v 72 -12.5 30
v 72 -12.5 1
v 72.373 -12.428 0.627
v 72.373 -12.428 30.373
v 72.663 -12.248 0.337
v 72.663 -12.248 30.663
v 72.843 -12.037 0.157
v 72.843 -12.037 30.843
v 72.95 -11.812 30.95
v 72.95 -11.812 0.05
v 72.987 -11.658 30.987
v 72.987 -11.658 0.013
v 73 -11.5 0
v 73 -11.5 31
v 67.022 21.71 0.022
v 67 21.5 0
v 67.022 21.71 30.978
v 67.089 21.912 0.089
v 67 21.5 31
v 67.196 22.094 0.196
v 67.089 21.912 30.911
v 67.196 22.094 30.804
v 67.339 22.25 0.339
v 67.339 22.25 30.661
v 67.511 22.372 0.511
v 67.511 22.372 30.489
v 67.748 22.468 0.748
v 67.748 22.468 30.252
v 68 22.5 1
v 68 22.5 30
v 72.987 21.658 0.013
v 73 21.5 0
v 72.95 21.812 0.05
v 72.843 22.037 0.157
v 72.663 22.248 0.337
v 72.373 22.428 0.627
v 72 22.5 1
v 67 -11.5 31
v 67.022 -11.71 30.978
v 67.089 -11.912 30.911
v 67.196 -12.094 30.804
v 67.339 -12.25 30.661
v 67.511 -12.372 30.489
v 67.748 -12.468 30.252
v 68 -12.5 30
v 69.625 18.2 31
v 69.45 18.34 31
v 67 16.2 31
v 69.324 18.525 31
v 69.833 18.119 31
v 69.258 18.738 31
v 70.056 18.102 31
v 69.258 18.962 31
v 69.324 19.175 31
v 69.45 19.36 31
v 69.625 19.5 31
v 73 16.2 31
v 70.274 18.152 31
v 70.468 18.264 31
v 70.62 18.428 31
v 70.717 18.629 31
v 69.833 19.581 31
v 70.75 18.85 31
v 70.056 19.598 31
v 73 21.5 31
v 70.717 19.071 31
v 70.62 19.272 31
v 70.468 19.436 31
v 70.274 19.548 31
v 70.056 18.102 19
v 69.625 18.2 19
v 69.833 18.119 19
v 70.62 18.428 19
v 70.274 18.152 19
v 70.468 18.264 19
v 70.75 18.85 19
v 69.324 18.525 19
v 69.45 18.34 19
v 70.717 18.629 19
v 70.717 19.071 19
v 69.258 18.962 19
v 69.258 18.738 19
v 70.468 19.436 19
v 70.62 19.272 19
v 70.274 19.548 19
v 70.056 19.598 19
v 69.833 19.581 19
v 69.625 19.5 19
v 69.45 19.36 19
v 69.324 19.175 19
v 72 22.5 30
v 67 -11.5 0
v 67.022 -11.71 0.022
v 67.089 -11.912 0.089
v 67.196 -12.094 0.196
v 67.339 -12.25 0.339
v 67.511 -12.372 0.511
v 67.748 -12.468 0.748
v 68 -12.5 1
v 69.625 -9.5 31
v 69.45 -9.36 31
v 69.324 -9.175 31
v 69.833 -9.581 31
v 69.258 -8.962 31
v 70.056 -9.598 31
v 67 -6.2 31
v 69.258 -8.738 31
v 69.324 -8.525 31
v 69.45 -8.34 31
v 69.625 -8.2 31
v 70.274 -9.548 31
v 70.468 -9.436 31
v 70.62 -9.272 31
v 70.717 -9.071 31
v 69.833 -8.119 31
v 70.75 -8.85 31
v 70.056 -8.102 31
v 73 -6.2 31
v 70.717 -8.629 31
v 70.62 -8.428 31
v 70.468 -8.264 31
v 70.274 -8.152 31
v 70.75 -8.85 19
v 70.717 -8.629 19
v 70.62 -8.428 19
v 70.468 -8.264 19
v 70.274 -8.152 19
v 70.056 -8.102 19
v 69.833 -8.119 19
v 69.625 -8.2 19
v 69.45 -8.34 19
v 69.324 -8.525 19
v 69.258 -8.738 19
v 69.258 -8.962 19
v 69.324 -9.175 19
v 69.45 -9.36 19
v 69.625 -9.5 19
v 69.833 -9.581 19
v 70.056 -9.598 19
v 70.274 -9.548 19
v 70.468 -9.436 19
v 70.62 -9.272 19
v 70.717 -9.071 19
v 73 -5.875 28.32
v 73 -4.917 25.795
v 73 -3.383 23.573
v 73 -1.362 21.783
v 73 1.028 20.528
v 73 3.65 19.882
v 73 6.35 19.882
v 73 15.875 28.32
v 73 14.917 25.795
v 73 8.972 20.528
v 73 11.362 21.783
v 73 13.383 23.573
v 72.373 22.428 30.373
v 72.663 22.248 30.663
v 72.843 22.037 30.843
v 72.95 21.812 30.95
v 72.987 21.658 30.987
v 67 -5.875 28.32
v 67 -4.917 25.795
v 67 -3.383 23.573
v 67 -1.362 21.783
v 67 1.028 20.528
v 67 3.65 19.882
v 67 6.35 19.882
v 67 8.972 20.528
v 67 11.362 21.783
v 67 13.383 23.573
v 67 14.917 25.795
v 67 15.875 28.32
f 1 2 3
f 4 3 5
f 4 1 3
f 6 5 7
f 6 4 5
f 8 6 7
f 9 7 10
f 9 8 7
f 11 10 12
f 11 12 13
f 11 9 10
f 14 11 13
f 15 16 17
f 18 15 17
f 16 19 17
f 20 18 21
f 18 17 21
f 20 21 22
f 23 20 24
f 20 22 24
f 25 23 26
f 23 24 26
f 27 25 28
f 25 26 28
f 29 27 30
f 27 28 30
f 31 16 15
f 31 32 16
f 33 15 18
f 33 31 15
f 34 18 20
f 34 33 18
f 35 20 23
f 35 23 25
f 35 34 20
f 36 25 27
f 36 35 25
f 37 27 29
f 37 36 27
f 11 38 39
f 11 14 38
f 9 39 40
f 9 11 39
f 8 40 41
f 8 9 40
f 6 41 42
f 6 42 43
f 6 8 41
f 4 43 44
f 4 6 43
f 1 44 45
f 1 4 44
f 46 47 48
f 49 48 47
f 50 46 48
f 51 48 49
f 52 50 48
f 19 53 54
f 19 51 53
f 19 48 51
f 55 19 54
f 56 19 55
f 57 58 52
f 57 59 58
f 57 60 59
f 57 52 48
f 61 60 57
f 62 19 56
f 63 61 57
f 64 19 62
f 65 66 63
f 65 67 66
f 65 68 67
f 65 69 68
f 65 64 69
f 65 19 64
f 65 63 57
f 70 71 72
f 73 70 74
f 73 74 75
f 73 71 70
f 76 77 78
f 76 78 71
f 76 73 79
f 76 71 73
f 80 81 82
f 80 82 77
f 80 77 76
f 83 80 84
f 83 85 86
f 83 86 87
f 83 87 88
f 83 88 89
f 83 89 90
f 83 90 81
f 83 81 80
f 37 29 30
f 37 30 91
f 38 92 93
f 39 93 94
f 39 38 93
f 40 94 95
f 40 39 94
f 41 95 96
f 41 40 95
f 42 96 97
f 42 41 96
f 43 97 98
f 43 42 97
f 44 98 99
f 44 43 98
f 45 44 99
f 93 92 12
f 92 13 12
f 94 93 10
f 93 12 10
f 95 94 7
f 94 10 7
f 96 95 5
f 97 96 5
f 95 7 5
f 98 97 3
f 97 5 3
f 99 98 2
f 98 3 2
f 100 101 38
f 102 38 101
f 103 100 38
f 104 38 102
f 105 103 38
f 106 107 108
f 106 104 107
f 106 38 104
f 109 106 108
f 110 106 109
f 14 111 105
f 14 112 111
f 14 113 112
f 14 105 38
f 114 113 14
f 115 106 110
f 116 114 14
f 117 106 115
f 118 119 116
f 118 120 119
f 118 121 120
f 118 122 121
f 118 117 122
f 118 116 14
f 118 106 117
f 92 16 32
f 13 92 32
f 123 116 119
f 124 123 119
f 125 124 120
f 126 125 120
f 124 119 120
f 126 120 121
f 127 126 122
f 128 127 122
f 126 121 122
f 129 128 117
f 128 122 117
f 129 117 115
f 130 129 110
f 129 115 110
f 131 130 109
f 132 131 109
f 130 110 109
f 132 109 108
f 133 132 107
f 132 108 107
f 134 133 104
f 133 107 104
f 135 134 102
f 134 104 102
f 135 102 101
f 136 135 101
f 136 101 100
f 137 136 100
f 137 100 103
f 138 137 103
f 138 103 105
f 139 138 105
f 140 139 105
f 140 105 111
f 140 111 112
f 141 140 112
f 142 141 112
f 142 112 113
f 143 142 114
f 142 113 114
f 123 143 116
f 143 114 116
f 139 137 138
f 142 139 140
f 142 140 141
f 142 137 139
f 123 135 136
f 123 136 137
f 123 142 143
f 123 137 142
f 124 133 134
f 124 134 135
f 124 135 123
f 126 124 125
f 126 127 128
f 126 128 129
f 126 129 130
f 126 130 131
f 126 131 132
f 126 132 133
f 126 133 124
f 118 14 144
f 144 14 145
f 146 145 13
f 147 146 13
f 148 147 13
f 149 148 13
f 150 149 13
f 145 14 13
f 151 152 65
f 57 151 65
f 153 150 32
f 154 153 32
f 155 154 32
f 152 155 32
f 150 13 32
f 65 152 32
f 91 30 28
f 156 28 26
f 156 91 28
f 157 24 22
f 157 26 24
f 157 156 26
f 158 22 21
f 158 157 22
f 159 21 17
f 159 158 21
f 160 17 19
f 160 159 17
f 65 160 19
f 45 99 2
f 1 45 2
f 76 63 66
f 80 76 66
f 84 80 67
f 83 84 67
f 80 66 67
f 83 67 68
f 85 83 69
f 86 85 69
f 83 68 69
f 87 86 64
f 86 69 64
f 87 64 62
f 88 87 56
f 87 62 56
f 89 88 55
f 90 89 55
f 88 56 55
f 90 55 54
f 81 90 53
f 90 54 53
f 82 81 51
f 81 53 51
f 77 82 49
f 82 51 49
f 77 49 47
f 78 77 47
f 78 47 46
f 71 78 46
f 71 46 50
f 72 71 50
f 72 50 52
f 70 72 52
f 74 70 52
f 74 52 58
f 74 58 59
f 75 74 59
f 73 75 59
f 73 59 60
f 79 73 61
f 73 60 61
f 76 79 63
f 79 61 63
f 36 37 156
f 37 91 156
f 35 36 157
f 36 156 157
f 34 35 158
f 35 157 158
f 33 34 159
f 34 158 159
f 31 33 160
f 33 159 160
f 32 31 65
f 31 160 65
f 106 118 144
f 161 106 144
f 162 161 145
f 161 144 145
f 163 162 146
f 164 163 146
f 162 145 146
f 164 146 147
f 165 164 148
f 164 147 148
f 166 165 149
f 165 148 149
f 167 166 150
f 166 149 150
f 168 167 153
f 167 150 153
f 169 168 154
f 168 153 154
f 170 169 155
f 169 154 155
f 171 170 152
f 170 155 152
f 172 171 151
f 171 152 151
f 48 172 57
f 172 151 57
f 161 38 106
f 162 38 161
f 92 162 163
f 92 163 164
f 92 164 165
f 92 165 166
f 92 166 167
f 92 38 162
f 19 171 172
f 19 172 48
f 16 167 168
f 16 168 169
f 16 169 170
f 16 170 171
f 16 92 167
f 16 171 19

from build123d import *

# Parameters (mm, degrees)
SKETCH020_W     = 6
SKETCH020_H     = 35
PAD004_DEPTH    = 31
SKETCH021_R     = 11.2
POCKET_DEPTH    = 6.001
FILLET004_R     = 1
SKETCH027_R     = 0.75
POCKET009_DEPTH = 12


with BuildPart() as part:
    # Sketch020 → Pad004 (new body)
    with BuildSketch(Plane.XY):
        with Locations((70, 5)):
            Rectangle(SKETCH020_W, SKETCH020_H)
    extrude(amount=PAD004_DEPTH)

    # Sketch021 → Pocket (cut, through all)
    with BuildSketch(Plane.YZ.offset(73)):
        with Locations((5, 31)):
            Circle(SKETCH021_R)
    extrude(amount=-POCKET_DEPTH, mode=Mode.SUBTRACT)

    # Fillet004
    fillet004_edges = [part.edges().sort_by_distance(p)[0] for p in [
        (73, -12.5, 15.5),
        (67, -12.5, 15.5),
        (70, -12.5, 0),
        (70, -12.5, 31),
        (67, 22.5, 15.5),
        (73, 22.5, 15.5),
        (70, 22.5, 0),
        (70, 22.5, 31),
    ]]
    fillet(fillet004_edges, radius=FILLET004_R)

    # Sketch027 → Pocket009 (cut)
    with BuildSketch(Plane.XY.offset(31)):
        with Locations((70, 18.85)):
            Circle(SKETCH027_R)
        with Locations((70, -8.85)):
            Circle(SKETCH027_R)
    extrude(amount=-POCKET009_DEPTH, mode=Mode.SUBTRACT)


solid = part.part
